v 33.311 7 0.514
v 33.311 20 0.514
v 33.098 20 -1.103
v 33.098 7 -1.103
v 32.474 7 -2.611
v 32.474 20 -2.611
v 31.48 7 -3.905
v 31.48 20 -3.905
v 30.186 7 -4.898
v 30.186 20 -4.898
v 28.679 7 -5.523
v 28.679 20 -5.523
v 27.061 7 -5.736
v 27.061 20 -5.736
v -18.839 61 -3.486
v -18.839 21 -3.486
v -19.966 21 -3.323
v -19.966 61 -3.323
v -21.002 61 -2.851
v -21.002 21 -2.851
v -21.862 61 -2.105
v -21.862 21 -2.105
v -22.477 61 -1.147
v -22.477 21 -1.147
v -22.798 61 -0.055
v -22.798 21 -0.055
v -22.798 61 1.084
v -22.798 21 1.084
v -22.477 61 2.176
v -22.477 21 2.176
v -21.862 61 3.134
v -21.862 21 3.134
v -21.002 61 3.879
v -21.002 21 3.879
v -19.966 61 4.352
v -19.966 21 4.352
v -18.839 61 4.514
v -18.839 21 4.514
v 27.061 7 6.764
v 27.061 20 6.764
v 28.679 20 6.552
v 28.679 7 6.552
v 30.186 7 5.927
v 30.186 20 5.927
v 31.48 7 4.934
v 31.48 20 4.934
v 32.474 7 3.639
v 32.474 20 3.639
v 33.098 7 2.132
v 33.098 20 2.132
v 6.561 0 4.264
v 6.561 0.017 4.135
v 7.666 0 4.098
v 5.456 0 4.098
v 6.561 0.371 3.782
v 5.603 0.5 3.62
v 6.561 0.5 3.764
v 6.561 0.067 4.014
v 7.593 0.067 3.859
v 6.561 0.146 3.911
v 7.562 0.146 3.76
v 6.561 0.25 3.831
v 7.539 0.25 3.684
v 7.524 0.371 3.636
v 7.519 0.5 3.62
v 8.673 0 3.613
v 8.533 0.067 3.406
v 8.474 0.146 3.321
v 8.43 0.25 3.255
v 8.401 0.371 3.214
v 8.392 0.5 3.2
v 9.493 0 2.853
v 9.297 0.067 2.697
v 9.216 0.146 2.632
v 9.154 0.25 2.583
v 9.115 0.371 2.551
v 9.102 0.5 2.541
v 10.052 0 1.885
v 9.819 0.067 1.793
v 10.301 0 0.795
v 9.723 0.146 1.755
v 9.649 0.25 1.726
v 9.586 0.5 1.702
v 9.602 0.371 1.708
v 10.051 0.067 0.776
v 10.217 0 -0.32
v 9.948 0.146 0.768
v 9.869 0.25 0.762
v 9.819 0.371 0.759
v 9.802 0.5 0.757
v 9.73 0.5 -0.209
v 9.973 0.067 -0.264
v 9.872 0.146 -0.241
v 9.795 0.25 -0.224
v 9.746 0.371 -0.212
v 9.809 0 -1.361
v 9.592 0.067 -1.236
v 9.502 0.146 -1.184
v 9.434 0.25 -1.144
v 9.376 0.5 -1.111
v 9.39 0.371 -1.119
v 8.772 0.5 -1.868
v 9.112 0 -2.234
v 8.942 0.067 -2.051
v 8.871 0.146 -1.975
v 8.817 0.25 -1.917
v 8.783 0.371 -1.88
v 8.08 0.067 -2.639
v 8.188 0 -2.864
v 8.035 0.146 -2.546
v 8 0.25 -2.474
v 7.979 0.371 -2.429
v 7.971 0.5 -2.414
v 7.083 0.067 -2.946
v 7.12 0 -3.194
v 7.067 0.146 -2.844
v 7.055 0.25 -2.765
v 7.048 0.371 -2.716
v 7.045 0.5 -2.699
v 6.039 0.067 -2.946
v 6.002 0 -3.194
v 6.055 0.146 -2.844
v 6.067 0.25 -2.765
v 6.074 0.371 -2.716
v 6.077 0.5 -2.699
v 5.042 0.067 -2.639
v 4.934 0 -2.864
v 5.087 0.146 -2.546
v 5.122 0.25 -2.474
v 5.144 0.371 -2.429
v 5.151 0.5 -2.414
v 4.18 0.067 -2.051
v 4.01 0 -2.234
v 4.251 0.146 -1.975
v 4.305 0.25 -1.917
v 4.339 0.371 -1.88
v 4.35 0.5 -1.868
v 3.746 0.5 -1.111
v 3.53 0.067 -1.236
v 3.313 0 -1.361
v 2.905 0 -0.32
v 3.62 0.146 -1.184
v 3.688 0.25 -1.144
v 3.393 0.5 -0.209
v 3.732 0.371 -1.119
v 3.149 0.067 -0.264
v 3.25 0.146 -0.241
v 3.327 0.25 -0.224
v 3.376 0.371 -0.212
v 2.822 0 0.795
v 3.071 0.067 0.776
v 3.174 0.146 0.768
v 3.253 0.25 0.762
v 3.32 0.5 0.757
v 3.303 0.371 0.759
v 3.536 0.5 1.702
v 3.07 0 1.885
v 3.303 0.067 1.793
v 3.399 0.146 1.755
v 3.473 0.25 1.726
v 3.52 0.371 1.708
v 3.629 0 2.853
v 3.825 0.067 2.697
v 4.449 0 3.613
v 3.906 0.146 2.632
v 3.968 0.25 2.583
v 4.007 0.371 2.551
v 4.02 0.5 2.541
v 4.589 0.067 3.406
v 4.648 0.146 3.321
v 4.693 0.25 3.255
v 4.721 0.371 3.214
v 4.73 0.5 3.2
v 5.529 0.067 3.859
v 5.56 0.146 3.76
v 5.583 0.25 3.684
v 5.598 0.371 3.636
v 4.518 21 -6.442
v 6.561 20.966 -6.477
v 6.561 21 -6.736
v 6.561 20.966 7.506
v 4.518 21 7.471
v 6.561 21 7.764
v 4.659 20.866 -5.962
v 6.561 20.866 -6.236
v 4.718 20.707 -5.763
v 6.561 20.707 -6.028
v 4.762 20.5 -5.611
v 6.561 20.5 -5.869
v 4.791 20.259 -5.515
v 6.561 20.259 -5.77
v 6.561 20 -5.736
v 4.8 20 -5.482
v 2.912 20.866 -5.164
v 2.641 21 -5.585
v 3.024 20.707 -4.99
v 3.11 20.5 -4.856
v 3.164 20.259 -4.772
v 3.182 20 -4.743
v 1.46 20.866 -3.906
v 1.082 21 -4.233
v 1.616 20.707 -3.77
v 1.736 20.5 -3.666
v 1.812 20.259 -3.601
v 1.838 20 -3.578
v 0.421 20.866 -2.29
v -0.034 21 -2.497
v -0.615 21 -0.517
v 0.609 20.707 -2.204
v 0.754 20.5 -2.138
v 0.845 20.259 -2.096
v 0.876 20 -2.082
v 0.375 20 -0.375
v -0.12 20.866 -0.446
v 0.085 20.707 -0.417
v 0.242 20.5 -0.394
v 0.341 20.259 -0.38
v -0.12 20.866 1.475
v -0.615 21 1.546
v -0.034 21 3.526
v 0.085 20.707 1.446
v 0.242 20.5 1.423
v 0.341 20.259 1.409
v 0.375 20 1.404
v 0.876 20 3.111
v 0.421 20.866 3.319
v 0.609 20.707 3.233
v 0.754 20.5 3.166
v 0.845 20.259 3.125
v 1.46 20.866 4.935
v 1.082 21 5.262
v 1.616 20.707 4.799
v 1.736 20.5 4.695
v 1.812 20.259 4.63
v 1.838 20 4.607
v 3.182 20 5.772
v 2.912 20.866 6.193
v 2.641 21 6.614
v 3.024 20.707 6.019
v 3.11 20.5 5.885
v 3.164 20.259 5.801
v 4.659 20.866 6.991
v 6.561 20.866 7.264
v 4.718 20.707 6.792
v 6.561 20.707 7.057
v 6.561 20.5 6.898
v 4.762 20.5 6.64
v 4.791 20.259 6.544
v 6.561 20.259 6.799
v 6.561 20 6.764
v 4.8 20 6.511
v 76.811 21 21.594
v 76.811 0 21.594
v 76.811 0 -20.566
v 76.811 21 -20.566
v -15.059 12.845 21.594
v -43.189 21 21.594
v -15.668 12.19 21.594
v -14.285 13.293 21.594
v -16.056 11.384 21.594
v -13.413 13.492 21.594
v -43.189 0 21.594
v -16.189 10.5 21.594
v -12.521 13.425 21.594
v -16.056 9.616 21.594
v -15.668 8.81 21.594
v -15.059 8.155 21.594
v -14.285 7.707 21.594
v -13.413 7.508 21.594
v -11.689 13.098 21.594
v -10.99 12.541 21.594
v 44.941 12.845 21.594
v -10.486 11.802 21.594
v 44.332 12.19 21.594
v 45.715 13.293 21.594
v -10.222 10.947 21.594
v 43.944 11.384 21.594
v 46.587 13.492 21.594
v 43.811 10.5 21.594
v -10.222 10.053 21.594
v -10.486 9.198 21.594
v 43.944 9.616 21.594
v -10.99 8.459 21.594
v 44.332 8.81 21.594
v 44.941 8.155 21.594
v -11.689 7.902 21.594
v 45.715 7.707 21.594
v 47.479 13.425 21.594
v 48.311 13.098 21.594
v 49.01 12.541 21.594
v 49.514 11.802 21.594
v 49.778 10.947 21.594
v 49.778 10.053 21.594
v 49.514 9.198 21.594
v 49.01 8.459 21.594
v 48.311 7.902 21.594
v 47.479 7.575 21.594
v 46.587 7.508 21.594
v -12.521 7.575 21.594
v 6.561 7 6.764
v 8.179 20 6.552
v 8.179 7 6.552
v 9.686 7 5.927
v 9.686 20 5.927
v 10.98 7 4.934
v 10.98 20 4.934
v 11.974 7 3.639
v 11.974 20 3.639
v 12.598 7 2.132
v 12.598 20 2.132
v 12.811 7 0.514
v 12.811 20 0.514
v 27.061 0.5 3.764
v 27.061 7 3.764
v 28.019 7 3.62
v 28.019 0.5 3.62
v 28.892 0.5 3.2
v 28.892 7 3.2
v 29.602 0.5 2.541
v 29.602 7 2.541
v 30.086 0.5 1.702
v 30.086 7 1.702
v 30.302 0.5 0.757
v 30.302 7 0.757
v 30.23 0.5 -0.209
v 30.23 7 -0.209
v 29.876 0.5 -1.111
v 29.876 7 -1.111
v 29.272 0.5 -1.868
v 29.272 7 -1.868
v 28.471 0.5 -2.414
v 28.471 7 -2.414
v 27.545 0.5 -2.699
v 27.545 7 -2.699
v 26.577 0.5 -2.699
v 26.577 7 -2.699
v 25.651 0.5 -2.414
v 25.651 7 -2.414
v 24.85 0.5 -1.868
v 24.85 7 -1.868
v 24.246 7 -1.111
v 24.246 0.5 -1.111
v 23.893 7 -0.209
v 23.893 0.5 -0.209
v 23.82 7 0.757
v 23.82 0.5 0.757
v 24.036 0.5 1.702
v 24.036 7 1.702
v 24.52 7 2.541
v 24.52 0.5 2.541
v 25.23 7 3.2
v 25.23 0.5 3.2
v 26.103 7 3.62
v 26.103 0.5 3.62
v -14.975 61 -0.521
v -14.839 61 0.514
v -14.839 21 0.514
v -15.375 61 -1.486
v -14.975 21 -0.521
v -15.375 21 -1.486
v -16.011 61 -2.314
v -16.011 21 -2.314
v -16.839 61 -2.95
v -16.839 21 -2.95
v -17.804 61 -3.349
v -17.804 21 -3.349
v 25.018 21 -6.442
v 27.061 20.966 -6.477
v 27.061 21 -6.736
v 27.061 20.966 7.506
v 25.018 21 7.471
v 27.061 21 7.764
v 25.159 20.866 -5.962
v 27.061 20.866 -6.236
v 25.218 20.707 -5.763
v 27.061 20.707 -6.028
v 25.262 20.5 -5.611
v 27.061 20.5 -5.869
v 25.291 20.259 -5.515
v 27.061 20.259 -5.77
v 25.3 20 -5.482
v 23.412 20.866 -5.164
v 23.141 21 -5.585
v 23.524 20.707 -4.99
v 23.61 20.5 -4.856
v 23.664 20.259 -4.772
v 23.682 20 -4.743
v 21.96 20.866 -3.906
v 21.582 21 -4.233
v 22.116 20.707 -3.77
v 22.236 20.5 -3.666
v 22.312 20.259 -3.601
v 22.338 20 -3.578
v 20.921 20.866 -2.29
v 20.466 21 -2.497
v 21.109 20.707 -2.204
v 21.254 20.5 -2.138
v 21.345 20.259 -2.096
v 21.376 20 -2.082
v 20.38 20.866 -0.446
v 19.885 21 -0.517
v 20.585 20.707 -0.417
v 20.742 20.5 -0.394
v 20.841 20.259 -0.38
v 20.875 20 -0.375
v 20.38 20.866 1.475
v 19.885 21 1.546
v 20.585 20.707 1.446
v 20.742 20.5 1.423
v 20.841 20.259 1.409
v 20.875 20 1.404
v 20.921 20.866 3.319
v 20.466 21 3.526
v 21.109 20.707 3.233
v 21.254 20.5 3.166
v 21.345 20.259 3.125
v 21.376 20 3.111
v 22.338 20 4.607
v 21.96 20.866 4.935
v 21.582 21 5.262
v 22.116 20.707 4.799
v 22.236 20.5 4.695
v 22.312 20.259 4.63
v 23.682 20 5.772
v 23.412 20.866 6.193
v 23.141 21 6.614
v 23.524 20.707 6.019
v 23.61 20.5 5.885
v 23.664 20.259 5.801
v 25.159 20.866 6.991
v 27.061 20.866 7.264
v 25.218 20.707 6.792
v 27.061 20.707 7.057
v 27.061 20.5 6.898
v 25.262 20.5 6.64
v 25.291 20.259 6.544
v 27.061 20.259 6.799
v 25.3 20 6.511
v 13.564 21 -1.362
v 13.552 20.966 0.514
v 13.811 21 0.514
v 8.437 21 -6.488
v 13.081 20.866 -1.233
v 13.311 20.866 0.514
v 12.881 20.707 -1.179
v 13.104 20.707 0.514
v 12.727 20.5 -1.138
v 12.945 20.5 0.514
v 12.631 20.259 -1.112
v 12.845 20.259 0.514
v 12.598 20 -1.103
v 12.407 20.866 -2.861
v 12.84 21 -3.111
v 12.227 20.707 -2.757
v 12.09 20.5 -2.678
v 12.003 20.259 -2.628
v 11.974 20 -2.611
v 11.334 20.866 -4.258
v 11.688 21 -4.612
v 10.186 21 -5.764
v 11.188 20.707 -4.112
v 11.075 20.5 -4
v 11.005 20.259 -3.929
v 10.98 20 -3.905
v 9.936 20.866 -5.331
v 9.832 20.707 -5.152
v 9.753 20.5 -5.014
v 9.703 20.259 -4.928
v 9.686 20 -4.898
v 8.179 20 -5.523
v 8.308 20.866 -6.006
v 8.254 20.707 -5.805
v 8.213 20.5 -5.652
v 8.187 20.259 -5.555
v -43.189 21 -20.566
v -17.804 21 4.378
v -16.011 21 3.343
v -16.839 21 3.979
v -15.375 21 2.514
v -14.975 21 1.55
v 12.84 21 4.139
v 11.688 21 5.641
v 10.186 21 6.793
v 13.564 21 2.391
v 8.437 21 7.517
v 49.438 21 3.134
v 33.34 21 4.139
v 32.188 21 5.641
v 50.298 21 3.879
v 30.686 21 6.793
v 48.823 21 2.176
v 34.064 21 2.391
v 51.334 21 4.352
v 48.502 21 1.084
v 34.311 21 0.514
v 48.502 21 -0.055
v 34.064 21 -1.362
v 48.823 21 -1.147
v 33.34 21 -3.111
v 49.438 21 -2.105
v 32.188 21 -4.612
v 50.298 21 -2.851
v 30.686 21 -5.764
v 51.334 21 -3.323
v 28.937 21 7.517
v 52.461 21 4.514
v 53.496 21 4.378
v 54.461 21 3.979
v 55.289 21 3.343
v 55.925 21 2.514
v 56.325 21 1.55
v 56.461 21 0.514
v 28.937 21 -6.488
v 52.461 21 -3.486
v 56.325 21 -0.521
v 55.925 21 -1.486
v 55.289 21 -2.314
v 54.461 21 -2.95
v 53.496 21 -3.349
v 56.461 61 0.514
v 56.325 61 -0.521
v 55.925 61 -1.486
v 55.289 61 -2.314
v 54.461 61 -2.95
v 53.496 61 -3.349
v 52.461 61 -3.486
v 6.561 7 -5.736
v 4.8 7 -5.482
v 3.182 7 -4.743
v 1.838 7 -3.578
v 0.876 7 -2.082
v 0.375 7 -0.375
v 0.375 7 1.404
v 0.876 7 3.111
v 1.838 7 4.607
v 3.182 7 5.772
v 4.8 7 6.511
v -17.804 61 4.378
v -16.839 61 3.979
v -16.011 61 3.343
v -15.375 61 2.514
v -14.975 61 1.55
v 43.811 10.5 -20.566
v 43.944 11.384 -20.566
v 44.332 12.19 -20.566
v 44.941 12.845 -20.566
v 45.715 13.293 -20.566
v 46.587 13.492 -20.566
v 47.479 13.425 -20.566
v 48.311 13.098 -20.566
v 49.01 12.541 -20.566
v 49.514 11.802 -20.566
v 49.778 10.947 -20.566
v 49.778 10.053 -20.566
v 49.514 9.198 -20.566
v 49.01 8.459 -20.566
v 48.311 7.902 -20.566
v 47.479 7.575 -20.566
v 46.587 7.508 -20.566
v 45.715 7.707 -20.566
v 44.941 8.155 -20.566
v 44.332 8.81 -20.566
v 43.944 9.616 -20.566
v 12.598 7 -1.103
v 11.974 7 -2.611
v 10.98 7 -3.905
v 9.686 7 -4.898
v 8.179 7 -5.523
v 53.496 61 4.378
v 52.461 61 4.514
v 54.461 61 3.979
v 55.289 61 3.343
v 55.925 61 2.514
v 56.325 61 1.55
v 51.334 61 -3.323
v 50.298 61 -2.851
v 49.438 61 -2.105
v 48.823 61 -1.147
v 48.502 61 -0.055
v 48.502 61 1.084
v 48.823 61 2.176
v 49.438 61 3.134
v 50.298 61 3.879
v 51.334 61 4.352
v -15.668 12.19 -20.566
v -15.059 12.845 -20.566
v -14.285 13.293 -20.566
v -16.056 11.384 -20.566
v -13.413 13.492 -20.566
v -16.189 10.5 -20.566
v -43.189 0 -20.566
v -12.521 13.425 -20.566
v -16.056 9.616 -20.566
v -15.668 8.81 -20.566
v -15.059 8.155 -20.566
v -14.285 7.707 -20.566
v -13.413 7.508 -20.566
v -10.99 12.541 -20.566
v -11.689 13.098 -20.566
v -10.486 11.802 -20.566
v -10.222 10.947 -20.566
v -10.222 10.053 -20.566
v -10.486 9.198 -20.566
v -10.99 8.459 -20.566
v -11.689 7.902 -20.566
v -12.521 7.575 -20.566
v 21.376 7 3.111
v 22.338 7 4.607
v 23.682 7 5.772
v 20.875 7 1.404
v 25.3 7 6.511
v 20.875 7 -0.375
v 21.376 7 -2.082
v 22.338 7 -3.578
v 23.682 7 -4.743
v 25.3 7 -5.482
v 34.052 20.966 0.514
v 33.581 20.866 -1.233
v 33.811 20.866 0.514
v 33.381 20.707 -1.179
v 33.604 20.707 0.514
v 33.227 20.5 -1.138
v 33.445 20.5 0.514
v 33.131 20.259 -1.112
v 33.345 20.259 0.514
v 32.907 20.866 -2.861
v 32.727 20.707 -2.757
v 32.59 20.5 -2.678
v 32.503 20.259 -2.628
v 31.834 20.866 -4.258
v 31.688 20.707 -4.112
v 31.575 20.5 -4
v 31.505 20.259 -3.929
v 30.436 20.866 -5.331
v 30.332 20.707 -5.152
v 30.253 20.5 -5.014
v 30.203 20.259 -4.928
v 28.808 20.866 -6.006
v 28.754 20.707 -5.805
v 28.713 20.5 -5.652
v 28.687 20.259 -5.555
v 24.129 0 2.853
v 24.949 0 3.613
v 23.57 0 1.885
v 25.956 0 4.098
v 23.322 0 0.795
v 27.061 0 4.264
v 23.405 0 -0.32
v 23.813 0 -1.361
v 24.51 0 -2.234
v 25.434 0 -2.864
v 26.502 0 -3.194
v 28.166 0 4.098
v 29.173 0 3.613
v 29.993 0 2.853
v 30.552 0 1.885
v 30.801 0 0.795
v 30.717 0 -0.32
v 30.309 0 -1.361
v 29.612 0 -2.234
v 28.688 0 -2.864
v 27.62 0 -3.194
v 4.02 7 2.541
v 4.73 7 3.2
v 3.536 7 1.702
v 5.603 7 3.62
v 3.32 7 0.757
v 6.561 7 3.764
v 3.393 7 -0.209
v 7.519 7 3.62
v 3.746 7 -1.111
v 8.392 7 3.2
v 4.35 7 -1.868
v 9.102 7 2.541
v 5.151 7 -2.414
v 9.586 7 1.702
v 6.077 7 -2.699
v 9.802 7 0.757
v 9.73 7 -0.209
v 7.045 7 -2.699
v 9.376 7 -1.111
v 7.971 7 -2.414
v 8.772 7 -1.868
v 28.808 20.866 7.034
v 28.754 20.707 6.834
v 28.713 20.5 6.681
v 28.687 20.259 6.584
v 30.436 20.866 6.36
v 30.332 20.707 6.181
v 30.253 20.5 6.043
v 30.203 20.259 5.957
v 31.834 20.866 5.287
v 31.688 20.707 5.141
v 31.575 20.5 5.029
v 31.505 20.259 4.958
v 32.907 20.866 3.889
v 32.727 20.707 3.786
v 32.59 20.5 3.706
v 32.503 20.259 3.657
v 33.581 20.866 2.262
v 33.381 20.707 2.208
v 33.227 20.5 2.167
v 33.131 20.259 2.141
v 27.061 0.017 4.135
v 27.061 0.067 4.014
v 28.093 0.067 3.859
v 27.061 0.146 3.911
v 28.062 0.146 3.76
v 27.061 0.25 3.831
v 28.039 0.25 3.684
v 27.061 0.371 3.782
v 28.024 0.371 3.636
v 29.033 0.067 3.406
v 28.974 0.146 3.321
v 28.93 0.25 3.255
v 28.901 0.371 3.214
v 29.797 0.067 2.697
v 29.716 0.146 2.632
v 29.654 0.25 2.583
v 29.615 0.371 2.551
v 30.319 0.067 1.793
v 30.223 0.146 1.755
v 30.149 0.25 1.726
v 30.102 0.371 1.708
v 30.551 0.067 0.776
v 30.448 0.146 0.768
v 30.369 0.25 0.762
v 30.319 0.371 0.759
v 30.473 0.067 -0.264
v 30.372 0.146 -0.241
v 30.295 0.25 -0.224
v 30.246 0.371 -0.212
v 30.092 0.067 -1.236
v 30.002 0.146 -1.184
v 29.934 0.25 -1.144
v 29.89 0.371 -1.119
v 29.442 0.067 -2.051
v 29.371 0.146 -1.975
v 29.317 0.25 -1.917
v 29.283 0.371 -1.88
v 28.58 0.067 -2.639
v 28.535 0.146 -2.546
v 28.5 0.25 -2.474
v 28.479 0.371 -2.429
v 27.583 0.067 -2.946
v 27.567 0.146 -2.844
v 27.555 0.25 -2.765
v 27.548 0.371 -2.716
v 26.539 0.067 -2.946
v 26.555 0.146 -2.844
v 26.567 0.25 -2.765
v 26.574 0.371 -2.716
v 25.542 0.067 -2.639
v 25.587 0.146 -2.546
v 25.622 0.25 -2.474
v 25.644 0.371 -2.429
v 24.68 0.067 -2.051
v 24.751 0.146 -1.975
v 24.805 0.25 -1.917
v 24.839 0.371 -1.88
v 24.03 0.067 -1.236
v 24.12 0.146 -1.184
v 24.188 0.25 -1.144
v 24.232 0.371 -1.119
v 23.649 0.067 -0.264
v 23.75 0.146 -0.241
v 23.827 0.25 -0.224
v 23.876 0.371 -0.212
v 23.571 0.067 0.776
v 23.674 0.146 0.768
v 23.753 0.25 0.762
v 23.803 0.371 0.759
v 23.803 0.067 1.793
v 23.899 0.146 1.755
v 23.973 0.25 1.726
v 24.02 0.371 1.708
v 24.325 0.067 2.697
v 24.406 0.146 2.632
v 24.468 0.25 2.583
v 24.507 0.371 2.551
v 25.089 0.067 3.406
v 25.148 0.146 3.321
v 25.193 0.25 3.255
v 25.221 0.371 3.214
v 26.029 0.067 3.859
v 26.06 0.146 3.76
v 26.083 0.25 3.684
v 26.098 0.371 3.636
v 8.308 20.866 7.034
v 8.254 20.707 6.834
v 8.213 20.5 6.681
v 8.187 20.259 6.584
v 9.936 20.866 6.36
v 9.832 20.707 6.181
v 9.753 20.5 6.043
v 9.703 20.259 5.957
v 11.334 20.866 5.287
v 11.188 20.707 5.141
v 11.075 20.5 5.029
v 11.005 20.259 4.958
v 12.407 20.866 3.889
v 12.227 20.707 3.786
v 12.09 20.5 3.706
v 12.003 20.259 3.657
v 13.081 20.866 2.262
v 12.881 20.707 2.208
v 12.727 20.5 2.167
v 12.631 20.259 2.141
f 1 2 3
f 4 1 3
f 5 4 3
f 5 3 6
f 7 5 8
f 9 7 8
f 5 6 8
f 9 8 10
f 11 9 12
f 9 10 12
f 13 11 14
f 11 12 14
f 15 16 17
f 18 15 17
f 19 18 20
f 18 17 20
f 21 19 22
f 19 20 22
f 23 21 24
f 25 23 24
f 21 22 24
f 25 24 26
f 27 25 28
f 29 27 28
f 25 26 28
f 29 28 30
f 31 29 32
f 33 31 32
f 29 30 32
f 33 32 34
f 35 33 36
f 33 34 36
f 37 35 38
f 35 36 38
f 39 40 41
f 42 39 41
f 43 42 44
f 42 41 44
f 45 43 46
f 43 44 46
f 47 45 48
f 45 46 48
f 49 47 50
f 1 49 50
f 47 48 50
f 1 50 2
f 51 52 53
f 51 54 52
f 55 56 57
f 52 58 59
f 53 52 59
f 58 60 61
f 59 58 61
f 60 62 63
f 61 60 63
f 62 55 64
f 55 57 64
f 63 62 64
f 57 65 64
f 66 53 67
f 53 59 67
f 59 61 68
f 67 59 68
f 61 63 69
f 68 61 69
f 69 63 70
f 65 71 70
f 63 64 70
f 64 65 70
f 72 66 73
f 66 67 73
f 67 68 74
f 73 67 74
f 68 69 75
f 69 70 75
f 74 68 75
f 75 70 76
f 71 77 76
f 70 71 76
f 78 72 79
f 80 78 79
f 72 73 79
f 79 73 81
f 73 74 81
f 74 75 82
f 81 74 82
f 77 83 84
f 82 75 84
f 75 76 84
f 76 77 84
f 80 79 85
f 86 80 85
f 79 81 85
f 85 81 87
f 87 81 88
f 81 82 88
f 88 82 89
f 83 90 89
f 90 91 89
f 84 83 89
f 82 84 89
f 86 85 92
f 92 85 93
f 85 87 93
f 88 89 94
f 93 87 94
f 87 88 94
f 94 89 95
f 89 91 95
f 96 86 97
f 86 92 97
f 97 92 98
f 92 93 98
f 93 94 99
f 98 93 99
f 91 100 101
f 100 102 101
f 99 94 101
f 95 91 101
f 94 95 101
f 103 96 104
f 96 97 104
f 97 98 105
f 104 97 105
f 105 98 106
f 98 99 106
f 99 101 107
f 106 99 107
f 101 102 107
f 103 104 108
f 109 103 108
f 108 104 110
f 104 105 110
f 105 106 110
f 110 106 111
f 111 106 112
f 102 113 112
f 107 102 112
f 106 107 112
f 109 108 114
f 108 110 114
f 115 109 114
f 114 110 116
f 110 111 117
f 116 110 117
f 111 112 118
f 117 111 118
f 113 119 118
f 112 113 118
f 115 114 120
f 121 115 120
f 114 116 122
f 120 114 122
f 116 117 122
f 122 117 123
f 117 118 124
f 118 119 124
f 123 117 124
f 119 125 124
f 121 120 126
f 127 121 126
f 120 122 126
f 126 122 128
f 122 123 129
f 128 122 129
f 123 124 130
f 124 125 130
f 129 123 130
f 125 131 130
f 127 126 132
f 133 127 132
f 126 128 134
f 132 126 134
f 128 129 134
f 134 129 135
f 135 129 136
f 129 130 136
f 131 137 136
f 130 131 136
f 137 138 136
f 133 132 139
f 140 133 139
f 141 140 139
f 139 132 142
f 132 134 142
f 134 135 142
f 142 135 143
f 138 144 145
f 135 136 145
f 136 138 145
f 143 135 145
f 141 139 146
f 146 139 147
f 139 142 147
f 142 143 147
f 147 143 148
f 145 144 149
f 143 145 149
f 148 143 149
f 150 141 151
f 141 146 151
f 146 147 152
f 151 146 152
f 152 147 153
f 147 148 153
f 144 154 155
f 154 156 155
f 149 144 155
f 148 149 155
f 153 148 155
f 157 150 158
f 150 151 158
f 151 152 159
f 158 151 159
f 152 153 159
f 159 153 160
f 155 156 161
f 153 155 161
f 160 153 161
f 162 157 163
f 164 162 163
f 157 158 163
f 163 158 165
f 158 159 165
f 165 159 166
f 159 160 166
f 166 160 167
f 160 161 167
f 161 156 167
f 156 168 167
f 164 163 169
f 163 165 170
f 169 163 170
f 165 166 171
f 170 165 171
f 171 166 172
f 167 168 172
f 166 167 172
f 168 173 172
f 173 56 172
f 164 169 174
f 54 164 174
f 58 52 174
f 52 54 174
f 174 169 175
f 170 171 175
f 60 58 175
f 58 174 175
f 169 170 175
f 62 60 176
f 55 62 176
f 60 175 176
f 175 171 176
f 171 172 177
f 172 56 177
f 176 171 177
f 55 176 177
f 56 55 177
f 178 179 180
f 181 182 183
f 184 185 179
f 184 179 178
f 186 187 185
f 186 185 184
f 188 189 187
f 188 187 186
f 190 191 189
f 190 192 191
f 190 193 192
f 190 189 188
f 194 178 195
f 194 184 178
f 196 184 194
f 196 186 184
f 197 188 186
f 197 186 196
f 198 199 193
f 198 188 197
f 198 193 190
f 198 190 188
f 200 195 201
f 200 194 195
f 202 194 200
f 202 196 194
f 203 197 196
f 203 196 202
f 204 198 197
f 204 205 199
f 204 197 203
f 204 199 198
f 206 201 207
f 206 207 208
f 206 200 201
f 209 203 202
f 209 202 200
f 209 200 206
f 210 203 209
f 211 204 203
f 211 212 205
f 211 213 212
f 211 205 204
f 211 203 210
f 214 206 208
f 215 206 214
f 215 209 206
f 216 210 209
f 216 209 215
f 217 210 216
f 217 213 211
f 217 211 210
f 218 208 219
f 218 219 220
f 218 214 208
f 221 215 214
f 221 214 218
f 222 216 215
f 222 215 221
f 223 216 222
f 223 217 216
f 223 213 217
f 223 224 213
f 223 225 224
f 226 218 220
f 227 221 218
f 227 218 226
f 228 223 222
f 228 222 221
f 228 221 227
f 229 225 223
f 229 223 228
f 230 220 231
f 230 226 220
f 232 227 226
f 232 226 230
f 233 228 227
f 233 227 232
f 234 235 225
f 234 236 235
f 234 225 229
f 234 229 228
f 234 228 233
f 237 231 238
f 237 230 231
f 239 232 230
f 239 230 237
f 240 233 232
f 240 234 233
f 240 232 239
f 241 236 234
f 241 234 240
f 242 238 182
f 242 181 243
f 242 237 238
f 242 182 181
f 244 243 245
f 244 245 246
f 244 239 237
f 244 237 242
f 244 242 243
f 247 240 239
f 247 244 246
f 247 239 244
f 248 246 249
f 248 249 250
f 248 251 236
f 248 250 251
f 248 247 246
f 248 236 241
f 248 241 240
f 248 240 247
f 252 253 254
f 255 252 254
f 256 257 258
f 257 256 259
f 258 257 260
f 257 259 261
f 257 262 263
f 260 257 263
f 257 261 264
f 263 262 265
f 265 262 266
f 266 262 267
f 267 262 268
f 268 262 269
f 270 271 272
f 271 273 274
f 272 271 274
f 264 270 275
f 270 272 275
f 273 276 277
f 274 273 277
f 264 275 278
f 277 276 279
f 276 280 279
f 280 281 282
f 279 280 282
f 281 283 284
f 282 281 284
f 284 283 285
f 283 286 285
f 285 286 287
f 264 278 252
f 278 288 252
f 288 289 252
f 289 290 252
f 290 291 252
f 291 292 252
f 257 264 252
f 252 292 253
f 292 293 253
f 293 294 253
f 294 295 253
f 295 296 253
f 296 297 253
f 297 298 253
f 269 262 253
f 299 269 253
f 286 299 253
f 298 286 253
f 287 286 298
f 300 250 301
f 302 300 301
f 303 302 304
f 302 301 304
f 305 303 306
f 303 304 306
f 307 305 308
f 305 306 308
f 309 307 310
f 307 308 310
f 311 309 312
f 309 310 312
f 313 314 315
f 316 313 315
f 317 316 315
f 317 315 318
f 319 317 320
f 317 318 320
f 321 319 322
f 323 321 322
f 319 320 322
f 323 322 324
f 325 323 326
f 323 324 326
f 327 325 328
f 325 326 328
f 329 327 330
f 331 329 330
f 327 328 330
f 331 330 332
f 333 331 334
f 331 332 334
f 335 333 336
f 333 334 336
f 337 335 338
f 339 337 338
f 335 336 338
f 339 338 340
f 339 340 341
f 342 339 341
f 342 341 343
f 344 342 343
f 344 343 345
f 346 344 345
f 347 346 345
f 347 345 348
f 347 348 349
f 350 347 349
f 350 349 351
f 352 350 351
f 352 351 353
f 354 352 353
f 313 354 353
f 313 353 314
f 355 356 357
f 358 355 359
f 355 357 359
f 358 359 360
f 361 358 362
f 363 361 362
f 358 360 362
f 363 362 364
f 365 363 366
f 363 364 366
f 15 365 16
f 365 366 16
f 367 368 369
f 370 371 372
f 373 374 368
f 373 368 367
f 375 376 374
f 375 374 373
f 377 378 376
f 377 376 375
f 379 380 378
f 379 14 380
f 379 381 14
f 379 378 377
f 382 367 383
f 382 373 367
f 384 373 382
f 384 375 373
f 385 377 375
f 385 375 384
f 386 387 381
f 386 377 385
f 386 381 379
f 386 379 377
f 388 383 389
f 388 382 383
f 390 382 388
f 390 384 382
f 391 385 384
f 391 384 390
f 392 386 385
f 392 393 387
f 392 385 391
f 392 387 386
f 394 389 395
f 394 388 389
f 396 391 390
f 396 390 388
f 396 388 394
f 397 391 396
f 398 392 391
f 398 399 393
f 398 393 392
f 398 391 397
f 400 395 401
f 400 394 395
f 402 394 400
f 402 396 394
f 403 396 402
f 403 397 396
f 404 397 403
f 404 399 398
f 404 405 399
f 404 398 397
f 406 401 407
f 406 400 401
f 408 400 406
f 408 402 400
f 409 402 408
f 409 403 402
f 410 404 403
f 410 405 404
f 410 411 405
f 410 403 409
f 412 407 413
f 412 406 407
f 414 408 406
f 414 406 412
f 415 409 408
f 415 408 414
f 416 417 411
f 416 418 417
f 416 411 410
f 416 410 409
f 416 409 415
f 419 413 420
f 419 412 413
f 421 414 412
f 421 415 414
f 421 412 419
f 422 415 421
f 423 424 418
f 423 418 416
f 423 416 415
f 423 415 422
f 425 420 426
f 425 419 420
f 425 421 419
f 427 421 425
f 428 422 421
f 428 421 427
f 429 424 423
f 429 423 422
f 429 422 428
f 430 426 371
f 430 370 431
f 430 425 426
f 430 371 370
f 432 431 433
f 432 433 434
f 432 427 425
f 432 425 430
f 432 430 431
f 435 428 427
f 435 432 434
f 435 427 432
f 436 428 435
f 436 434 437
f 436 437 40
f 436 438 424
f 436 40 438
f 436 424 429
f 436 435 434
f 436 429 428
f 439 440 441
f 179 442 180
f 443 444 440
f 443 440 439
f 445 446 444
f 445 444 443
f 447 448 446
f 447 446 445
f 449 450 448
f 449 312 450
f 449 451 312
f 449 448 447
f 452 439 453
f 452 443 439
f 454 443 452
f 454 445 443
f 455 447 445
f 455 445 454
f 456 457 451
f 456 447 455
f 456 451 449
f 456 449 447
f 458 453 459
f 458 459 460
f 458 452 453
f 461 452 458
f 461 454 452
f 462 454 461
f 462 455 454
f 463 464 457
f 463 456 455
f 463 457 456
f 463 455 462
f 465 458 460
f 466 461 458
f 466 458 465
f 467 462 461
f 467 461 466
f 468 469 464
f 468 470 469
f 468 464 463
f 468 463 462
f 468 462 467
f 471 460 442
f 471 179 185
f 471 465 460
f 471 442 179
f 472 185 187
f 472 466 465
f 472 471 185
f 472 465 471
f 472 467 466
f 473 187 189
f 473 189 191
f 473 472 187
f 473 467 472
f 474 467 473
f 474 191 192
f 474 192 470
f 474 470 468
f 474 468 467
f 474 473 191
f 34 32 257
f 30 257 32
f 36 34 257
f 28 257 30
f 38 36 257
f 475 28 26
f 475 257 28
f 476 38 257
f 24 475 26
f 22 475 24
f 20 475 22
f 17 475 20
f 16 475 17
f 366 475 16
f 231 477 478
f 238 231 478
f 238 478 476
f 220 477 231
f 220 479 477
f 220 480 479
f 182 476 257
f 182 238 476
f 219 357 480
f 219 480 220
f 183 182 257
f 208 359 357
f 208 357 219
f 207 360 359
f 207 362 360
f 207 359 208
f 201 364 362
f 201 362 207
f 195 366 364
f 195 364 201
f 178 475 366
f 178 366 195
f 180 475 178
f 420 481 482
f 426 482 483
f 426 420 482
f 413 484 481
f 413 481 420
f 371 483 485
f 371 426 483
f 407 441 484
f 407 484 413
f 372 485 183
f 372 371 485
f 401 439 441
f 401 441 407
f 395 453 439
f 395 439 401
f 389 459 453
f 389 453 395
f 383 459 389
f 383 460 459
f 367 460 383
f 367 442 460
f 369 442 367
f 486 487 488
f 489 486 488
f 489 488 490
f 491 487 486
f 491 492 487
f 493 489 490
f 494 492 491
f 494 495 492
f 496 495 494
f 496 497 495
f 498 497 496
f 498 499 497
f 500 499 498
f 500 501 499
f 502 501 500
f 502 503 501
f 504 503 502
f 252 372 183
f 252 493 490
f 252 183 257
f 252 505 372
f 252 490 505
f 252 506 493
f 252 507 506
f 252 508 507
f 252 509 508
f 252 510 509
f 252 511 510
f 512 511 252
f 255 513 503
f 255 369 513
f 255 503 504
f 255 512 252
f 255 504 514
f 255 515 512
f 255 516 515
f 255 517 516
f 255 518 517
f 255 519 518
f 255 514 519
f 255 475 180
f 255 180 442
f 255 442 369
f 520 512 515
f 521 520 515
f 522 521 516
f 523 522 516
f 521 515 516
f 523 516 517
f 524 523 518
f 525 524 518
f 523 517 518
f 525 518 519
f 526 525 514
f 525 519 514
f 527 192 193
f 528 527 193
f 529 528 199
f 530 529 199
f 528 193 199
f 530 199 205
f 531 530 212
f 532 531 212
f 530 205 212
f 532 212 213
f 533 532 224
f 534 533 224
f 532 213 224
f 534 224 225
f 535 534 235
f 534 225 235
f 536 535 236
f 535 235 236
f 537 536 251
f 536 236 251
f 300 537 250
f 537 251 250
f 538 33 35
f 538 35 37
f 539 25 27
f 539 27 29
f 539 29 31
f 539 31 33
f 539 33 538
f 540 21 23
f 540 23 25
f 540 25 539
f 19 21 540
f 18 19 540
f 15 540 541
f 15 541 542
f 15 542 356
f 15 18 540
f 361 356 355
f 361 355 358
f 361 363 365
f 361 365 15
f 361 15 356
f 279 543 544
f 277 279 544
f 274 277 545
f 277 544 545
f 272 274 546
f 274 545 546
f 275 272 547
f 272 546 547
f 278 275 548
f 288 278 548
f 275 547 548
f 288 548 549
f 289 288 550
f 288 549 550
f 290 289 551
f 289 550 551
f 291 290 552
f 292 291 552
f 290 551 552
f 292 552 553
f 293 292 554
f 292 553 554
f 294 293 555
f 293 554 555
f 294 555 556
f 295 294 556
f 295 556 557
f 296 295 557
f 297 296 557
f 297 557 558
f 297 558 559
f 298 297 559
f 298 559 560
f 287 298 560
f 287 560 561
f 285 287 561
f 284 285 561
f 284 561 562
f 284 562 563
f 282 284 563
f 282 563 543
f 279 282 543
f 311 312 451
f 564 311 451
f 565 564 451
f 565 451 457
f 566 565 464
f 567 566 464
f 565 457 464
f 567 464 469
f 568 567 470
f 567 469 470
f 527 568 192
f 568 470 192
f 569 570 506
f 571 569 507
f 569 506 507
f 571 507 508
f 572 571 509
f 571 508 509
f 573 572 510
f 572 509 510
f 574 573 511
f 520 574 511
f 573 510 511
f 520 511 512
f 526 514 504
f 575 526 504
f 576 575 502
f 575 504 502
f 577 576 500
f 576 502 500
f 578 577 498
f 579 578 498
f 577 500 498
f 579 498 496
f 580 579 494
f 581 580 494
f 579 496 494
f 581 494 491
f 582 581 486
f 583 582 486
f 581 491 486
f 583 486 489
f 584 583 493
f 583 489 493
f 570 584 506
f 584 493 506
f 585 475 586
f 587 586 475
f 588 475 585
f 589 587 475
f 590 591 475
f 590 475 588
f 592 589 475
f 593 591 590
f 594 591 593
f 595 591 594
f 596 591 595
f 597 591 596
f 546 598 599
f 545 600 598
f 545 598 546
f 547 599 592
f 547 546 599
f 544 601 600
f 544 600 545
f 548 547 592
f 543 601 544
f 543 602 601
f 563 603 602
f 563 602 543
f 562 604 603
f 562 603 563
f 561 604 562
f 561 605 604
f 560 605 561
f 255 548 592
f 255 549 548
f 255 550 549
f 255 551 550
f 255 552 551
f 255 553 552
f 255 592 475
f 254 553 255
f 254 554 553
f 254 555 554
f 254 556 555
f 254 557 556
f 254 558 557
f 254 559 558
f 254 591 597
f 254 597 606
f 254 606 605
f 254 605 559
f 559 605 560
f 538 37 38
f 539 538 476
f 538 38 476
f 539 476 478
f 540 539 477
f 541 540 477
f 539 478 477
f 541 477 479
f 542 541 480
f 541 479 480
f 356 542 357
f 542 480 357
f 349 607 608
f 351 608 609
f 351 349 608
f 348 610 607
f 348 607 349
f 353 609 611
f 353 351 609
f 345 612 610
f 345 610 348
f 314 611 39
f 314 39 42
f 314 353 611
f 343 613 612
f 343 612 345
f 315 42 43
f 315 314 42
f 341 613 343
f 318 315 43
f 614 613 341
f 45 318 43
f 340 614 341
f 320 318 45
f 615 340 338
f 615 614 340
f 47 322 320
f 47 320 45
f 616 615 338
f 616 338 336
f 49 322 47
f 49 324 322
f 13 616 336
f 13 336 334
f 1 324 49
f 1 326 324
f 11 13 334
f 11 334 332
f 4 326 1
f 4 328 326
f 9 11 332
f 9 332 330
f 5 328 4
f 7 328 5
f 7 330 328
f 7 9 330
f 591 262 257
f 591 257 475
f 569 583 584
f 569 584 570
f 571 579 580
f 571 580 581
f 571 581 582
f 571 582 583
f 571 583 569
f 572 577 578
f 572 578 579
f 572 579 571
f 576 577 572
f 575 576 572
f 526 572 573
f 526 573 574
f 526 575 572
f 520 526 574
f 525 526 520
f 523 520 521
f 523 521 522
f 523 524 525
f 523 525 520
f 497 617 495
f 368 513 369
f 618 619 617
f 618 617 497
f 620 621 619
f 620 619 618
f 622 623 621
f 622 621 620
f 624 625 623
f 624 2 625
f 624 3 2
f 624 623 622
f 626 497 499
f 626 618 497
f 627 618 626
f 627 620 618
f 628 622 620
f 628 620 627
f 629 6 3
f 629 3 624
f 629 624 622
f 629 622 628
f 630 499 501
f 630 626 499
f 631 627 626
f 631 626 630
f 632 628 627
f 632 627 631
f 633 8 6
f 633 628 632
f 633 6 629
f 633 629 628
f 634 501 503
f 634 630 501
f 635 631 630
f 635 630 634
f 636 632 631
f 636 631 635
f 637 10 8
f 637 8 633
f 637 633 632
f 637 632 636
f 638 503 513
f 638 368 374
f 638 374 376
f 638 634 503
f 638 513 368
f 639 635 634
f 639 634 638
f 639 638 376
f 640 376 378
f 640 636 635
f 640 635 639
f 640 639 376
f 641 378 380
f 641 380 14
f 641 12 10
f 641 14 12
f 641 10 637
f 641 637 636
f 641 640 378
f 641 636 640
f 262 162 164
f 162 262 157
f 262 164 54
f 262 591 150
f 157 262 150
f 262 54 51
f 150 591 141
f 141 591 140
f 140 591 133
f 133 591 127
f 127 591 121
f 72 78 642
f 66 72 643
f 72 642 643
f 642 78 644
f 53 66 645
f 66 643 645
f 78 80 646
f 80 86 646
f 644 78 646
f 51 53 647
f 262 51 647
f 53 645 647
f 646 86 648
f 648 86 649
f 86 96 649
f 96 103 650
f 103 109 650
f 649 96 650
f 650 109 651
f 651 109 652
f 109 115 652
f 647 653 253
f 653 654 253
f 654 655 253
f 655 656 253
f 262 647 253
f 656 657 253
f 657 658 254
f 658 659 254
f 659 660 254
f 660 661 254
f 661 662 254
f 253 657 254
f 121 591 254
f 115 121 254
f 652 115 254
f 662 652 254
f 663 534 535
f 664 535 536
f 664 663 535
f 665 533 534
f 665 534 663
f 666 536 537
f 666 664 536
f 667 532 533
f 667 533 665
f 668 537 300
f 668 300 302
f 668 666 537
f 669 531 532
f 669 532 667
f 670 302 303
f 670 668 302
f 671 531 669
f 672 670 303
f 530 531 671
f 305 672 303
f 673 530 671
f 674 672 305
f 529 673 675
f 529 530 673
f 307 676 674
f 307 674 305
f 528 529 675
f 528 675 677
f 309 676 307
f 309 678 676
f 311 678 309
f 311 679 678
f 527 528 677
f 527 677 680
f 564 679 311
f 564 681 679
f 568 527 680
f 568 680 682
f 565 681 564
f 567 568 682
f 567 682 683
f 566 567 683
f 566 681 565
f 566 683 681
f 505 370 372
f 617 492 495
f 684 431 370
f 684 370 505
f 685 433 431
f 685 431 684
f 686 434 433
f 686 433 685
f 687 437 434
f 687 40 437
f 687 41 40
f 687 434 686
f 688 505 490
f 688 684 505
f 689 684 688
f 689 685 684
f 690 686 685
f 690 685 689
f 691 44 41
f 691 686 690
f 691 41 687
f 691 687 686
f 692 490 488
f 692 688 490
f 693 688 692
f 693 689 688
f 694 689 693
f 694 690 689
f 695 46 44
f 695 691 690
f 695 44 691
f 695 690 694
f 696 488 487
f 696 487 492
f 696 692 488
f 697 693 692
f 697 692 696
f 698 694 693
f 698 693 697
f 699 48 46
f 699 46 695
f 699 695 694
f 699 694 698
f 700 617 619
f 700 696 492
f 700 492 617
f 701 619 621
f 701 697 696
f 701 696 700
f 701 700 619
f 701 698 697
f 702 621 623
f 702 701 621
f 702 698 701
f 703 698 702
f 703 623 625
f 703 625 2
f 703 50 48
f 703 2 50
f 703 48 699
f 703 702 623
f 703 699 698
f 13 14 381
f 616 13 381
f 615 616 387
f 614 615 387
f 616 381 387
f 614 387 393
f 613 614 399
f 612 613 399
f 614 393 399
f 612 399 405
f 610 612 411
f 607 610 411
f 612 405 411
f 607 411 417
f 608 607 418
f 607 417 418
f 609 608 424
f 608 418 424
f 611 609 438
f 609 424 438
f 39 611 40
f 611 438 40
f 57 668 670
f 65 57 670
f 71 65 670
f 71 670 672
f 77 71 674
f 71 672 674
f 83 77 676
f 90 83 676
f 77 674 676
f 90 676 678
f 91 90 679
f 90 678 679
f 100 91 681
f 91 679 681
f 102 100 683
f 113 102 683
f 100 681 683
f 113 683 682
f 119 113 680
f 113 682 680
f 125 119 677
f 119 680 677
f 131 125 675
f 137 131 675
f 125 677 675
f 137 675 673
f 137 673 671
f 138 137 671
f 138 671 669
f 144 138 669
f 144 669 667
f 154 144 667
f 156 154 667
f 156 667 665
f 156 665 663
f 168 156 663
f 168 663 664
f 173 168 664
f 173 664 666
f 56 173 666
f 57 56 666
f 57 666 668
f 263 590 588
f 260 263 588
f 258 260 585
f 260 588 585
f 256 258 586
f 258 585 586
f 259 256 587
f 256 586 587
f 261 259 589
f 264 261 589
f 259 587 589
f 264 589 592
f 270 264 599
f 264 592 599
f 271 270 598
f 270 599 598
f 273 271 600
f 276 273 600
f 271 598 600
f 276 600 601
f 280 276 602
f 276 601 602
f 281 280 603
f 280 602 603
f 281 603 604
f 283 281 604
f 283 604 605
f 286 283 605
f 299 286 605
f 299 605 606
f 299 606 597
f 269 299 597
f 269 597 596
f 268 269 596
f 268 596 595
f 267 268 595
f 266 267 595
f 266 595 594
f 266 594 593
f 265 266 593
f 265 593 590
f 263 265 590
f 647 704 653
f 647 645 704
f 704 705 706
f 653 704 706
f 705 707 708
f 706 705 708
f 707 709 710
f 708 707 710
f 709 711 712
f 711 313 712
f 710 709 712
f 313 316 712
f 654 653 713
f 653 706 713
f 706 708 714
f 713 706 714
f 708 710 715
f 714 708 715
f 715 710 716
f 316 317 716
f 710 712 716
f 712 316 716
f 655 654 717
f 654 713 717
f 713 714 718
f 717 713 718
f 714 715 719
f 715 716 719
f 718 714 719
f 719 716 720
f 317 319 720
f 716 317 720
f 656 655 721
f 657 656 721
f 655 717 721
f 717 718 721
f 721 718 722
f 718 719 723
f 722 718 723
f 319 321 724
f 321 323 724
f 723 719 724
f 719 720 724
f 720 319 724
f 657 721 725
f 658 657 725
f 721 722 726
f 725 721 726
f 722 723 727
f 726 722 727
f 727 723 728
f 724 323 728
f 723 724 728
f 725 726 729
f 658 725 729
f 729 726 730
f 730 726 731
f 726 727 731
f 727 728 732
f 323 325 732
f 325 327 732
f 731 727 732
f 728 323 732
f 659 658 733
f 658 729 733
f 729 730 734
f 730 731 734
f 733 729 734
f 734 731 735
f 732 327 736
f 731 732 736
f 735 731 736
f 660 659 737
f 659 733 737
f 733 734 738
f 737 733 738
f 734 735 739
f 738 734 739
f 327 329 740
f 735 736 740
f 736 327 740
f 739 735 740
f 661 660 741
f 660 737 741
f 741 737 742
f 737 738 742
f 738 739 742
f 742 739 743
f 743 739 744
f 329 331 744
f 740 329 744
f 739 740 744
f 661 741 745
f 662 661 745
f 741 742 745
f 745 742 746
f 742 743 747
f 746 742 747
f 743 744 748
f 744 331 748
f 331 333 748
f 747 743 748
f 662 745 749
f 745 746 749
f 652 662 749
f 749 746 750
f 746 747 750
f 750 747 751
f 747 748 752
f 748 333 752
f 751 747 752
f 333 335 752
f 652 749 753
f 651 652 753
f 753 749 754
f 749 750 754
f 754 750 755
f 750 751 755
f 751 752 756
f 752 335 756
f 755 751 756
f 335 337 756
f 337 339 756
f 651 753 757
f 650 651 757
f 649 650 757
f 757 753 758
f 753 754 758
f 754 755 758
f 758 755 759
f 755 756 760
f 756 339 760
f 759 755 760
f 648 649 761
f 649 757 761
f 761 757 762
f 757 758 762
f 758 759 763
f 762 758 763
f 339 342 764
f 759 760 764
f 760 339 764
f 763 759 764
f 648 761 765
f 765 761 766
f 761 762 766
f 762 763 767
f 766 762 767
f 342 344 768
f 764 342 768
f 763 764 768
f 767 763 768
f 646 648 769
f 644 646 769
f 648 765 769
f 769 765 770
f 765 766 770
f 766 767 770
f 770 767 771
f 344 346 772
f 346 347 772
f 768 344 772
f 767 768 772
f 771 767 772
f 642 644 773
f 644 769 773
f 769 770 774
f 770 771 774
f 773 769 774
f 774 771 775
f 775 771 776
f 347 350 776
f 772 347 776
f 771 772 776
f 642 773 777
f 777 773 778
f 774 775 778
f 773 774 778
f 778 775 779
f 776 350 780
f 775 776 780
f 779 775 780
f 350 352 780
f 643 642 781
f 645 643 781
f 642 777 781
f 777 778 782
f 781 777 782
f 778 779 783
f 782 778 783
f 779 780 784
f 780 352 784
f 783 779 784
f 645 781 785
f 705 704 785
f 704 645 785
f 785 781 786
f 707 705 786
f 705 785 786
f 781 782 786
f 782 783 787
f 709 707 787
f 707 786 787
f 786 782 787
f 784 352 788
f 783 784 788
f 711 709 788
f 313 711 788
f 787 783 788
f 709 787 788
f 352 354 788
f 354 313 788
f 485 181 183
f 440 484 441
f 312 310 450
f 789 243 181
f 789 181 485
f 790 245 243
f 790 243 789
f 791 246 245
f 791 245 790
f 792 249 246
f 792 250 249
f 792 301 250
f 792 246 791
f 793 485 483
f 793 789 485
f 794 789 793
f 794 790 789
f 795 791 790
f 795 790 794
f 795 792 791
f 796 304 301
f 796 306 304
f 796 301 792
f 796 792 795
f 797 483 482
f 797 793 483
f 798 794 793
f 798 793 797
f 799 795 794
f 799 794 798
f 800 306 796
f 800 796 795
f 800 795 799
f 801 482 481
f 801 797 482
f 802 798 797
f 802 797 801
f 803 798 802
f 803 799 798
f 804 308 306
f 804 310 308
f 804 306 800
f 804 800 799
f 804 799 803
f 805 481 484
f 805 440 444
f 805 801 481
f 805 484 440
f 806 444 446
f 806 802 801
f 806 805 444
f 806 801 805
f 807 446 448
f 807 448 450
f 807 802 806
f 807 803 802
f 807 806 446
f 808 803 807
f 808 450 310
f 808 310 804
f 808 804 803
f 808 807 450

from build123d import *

# Parameters (mm, degrees)
SKETCH1_W           = 120
SKETCH1_H           = 42.16
BOSS_EXTRUDE1_DEPTH = 21
SKETCH2_R           = 6.25
CUT_EXTRUDE1_DEPTH  = 14
SKETCH3_R           = 3.25
CUT_EXTRUDE2_DEPTH  = 82.007752785
FILLET1_R           = 1
FILLET2_R           = 0.5
SKETCH4_R           = 4
BOSS_EXTRUDE2_DEPTH = 40
SKETCH19_R          = 3
CUT_EXTRUDE3_DEPTH  = 107.763288693


with BuildPart() as part:
    # Sketch1 → Boss-Extrude1 (new body)
    with BuildSketch(Plane(origin=(0, 0, 0), x_dir=(1, 0, 0), z_dir=(0, 1, 0))):
        with Locations((16.811029237, -0.514485382)):
            Rectangle(SKETCH1_W, SKETCH1_H)
    extrude(amount=BOSS_EXTRUDE1_DEPTH)

    # Sketch2 → Cut-Extrude1 (cut)
    with BuildSketch(Plane(origin=(0, 21, 0), x_dir=(1, 0, 0), z_dir=(0, 1, 0))):
        with Locations((27.061029237, -0.514485382)):
            Circle(SKETCH2_R)
        with Locations((6.561029237, -0.514485382)):
            Circle(SKETCH2_R)
    extrude(amount=-CUT_EXTRUDE1_DEPTH, mode=Mode.SUBTRACT)

    # Sketch3 → Cut-Extrude2 (cut, through all)
    with BuildSketch(Plane(origin=(0, 7, 0), x_dir=(1, 0, 0), z_dir=(0, 1, 0))):
        with Locations((27.061029237, -0.514485382)):
            Circle(SKETCH3_R)
        with Locations((6.561029237, -0.514485382)):
            Circle(SKETCH3_R)
    extrude(amount=-CUT_EXTRUDE2_DEPTH, mode=Mode.SUBTRACT)

    # Fillet1
    fillet1_edges = [part.edges().sort_by_distance(p)[0] for p in [
        (0.311029237, 21, 0.514485382),
        (20.811029237, 21, 0.514485382),
    ]]
    fillet(fillet1_edges, radius=FILLET1_R)

    # Fillet2
    fillet2_edges = [part.edges().sort_by_distance(p)[0] for p in [
        (3.311029237, 0, 0.514485382),
        (23.811029237, 0, 0.514485382),
    ]]
    fillet(fillet2_edges, radius=FILLET2_R)

    # Sketch4 → Boss-Extrude2 (add)
    with BuildSketch(Plane(origin=(0, 21, 0), x_dir=(1, 0, 0), z_dir=(0, 1, 0))):
        with Locations((52.461029237, -0.514485382)):
            Circle(SKETCH4_R)
        with Locations((-18.838970763, -0.514485382)):
            Circle(SKETCH4_R)
    extrude(amount=BOSS_EXTRUDE2_DEPTH)

    # Sketch19 → Cut-Extrude3 (cut, through all)
    with BuildSketch(Plane(origin=(0, 0, -20.565514618), x_dir=(-1, 0, 0), z_dir=(0, 0, -1))):
        with Locations((13.188970763, 10.5)):
            Circle(SKETCH19_R)
        with Locations((-46.811029237, 10.5)):
            Circle(SKETCH19_R)
    extrude(amount=-CUT_EXTRUDE3_DEPTH, mode=Mode.SUBTRACT)


solid = part.part
